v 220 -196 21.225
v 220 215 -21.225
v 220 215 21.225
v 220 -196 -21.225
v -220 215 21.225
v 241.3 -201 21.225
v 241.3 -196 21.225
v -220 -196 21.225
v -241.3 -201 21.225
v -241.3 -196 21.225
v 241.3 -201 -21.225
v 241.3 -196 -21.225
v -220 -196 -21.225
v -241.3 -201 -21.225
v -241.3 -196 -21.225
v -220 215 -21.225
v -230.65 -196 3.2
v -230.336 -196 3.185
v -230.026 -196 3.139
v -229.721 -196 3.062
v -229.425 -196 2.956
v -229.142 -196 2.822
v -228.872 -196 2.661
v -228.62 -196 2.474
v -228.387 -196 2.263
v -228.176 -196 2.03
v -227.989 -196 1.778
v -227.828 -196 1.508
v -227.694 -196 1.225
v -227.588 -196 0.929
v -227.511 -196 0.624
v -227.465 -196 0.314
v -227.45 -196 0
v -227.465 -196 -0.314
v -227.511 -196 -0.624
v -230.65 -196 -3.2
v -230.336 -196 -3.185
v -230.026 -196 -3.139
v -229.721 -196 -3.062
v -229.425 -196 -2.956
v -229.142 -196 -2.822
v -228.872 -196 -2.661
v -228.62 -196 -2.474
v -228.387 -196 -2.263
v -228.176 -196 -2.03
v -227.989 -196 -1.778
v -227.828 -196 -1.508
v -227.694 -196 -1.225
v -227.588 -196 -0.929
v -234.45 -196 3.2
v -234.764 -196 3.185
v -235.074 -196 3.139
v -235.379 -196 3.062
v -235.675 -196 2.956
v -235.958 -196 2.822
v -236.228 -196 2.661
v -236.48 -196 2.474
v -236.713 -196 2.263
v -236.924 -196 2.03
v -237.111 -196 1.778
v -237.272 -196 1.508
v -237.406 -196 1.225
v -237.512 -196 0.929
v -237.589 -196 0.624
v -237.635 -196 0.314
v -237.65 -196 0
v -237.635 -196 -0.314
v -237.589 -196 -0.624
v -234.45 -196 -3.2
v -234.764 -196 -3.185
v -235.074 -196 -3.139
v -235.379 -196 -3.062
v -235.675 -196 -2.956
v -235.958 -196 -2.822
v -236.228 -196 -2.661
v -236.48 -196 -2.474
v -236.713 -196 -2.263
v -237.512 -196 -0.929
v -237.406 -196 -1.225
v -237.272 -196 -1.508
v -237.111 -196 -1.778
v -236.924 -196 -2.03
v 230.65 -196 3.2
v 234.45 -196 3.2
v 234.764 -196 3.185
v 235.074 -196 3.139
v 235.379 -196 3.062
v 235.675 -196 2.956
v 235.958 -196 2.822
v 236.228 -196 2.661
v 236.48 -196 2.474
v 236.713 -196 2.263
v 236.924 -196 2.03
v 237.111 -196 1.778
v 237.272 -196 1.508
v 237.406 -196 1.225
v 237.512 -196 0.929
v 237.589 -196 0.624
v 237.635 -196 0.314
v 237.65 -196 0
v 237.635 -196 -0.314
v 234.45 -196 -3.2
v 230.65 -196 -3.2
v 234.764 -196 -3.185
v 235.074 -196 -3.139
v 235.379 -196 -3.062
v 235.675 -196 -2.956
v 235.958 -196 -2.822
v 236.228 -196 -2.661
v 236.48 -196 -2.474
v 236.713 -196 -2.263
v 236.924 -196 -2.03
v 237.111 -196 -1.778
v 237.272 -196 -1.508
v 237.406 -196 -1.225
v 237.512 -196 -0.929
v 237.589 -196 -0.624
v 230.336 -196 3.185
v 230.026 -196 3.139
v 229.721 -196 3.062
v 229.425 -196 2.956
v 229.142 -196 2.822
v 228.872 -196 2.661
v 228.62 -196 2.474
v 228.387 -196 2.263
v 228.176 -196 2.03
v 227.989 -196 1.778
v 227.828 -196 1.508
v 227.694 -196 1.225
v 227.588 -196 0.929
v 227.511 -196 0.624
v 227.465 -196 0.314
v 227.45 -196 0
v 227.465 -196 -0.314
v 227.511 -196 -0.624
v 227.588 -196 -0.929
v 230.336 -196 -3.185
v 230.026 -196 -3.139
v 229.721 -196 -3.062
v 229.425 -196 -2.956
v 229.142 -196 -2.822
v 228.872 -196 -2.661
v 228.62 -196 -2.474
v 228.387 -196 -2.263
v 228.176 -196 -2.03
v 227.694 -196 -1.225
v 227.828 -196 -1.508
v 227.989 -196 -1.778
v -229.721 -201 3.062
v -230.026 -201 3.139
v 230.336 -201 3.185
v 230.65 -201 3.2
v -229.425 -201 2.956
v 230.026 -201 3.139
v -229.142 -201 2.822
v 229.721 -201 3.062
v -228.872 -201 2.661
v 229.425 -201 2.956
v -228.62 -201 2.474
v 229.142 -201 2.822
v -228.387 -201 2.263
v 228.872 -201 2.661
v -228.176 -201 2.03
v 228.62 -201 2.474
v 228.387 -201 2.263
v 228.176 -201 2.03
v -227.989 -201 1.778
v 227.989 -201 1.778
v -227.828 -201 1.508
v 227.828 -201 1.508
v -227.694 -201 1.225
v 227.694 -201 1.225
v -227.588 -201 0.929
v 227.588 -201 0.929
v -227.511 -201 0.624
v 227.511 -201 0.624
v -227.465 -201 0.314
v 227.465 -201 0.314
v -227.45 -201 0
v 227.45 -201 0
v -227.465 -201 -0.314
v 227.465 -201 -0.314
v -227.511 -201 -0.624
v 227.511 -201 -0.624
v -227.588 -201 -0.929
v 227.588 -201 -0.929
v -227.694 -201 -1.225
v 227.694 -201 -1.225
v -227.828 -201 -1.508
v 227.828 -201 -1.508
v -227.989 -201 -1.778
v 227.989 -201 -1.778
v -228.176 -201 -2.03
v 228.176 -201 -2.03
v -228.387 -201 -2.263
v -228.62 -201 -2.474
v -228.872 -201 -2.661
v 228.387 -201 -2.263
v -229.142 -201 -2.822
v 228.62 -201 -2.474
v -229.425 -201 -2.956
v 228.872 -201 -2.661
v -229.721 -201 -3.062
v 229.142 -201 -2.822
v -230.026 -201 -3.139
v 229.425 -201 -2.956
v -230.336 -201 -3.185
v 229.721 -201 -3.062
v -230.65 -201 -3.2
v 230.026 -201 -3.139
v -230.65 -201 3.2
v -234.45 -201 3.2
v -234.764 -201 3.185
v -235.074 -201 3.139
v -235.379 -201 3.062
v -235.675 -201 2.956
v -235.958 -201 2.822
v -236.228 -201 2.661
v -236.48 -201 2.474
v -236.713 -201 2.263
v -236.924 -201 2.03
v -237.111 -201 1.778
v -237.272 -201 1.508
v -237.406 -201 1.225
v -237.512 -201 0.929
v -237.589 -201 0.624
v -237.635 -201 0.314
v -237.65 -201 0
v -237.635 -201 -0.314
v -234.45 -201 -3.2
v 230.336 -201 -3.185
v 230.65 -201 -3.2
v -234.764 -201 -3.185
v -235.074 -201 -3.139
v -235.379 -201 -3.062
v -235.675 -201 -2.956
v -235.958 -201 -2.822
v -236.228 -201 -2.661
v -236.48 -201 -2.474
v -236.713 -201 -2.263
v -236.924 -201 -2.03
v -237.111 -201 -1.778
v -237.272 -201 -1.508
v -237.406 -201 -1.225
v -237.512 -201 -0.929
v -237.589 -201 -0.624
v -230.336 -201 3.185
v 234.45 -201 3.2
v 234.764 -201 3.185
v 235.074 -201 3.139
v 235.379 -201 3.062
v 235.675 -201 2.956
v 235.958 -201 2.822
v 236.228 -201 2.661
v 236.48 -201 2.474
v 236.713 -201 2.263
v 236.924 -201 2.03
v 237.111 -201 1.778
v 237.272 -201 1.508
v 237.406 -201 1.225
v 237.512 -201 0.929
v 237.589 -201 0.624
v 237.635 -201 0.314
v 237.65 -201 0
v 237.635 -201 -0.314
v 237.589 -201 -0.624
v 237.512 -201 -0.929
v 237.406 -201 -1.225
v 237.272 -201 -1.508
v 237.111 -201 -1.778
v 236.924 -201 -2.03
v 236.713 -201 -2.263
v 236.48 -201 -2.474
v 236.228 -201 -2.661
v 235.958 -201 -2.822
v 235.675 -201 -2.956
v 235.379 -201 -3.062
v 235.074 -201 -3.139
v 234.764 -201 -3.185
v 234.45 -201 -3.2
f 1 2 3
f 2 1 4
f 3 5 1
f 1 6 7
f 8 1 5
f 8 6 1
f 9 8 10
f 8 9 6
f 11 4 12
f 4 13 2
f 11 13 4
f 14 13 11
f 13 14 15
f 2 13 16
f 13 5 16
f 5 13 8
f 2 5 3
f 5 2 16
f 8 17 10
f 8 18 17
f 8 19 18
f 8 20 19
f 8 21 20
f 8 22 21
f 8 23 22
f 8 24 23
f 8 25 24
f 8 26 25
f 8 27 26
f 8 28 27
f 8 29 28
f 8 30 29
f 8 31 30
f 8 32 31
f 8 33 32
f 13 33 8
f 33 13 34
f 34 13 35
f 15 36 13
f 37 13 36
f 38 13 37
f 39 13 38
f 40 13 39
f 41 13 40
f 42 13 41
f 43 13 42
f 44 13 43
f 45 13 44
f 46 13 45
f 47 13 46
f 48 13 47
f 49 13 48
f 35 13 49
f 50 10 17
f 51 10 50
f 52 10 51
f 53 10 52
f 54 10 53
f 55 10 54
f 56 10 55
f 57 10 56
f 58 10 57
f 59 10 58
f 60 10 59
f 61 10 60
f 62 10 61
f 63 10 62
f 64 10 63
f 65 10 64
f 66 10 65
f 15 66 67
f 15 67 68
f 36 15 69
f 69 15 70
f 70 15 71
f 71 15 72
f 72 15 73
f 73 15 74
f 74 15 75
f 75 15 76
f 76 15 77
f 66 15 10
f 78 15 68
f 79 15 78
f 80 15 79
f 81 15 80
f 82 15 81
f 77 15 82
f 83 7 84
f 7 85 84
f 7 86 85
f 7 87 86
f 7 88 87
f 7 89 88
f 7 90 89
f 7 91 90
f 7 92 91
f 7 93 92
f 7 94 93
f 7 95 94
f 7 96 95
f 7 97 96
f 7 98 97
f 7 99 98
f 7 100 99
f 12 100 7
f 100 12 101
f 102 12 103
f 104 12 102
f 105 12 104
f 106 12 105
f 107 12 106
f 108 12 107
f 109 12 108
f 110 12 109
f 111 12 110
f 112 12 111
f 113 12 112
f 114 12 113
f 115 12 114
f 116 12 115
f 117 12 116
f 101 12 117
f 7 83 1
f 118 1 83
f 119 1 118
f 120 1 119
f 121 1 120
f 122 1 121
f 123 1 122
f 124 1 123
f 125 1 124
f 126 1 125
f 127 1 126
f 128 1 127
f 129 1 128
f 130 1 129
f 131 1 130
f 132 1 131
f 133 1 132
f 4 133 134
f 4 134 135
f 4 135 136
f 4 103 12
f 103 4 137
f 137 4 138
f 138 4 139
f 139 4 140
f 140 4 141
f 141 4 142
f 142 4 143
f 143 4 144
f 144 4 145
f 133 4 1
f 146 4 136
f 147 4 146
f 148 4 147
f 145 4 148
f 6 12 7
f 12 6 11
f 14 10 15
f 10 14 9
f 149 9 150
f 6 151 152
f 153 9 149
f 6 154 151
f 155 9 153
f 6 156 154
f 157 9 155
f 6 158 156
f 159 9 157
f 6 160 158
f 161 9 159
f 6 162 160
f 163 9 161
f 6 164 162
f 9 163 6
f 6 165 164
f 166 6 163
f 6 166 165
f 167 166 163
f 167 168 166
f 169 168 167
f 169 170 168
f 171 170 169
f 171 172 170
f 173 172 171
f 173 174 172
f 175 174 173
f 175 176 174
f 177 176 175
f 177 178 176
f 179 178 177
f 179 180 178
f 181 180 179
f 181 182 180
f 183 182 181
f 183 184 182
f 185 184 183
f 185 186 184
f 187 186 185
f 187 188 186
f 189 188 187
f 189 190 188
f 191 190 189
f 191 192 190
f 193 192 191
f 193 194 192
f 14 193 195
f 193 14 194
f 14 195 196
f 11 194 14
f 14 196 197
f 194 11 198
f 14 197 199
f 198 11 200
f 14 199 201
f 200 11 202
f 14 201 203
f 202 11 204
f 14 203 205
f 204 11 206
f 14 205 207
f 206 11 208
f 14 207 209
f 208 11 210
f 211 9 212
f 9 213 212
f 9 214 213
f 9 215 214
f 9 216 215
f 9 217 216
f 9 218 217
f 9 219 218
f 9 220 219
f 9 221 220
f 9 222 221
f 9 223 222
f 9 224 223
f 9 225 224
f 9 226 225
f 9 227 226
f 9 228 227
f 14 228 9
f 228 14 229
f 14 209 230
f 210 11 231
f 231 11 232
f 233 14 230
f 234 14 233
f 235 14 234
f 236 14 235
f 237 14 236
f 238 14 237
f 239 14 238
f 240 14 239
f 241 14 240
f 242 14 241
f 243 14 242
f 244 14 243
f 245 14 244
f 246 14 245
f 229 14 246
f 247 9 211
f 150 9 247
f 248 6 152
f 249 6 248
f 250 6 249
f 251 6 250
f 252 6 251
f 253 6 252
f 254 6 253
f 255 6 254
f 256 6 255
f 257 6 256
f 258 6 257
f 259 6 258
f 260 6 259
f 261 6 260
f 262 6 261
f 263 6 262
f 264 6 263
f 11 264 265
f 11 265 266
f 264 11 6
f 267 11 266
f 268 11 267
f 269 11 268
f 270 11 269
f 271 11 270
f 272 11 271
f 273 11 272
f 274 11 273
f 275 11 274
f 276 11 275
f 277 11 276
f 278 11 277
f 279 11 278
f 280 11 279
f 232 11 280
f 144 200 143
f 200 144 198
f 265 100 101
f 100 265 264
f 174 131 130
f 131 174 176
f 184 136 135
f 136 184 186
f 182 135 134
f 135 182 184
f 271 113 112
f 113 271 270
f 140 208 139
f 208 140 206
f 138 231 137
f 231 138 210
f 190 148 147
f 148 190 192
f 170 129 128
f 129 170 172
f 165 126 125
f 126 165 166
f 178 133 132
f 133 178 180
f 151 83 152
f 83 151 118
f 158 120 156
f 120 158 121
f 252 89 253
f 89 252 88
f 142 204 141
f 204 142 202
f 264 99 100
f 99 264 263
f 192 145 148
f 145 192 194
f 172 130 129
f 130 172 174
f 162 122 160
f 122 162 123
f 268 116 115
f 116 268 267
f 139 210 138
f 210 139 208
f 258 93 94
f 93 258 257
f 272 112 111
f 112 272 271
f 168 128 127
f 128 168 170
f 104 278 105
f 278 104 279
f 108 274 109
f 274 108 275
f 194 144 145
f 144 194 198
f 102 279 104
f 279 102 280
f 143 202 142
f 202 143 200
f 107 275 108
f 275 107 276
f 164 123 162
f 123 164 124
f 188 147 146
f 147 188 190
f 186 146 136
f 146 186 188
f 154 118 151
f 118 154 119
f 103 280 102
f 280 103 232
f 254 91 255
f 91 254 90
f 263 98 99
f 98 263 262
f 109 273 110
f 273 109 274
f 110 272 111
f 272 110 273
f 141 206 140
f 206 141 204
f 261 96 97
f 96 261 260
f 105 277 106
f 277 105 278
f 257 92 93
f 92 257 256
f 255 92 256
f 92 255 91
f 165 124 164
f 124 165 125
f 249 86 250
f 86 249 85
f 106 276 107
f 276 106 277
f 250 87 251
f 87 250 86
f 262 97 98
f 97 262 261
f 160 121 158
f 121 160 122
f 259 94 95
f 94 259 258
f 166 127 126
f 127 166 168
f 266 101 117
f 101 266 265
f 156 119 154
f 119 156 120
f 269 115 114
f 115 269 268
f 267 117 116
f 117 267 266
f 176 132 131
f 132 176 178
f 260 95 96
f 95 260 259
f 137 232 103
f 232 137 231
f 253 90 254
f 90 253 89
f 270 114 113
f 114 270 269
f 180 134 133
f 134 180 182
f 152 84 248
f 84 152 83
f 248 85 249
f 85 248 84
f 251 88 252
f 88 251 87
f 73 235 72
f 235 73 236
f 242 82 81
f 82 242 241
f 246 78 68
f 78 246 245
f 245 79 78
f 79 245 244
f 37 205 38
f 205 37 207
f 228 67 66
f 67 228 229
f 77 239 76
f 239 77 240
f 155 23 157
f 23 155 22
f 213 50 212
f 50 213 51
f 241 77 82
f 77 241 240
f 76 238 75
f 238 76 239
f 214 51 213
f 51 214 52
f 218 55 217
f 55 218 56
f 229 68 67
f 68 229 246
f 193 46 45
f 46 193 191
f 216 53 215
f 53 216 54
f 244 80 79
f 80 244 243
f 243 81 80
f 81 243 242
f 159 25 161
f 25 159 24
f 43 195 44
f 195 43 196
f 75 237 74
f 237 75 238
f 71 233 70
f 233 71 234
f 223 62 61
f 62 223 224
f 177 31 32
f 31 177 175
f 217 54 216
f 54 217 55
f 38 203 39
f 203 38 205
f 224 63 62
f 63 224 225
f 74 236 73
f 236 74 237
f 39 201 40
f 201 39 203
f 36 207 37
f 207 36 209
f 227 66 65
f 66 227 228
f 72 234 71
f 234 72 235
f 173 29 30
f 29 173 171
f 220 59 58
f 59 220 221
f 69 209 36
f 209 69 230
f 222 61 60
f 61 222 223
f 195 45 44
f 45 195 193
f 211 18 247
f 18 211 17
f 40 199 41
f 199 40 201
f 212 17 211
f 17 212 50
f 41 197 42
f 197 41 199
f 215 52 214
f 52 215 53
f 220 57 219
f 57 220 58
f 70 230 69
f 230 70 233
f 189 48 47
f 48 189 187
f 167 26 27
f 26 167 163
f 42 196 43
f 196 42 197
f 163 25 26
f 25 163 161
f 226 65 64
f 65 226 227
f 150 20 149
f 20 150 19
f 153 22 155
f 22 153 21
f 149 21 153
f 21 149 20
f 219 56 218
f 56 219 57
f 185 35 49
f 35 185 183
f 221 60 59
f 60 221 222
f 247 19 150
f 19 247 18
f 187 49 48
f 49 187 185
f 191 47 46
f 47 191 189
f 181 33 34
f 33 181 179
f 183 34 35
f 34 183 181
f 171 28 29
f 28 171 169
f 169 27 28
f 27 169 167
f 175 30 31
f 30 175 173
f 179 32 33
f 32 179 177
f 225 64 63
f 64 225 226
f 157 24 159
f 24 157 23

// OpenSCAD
// ============================================================================
// Atom Lithography Machine — Parametric OpenSCAD Module (S1.4-02)
// ============================================================================
// part_id           : S1.4-02
// parent_bom_id     : S1.4
// subsystem         : S1
// part_name         : Femtoamper / pikoamper elektrometre okuma modulu
// material          : Al 6061
// temp_stage        : 300 K (kabin)
// vacuum_grade      : Atmosfer
// tolerance         : ±0.2% okuma
// computed_mass_kg  : 5.35001
// envelope_mm       : 482.600 x 442.500 x 42.450
// design_maturity   : M0_M1_DETAILED_CAD_DESIGN_ONLY
// no_lab_measurement: true
// iec61508_certified: false
// semi_s2_certified : false
// Units: millimeters (mm)
// ============================================================================

$fn = 64;

// Nominal bounding envelope parameters (mm)
bbox_x = 482.6000;
bbox_y = 442.5000;
bbox_z = 42.4500;

// Part-specific parametric dimensions
rack_u = 1;
u_slot = "U33";
qty_units = 2;
resolution_fA = 10.0;

// Interface / port parameters (mm)
port_triax_in_ch1_od = 14.000;
port_triax_in_ch2_od = 14.000;

module part_S1_4_02() {
  difference() {
    union() {
      // 1U hollow 19-in chassis body (width along X)
      translate([0.000, 9.500, 0.000]) cube([440.000, 411.000, 42.450], center=true);
      // EIA-310 19-in front panel w/ mounting ears facing -Y
      translate([0.000, -198.500, 0.000]) cube([482.600, 5.000, 42.450], center=true);
    }
    // EIA-310 +X rack slot
    translate([232.550, -198.500, 0.000]) rotate([90.000, 0.000, 0.000]) {
      hull() {
        translate([-1.900, 0, 0]) cylinder(d=6.400, h=9.000, center=true);
        translate([1.900, 0, 0]) cylinder(d=6.400, h=9.000, center=true);
      }
    }
    // EIA-310 -X rack slot
    translate([-232.550, -198.500, 0.000]) rotate([90.000, 0.000, 0.000]) {
      hull() {
        translate([-1.900, 0, 0]) cylinder(d=6.400, h=9.000, center=true);
        translate([1.900, 0, 0]) cylinder(d=6.400, h=9.000, center=true);
      }
    }
  }
}

// World assembly mounting transform (global machine frame, mm / deg):
// translate([1480.000, -223.000, 1034.625]) rotate([0.000, 0.000, 0.000]) part_S1_4_02();

part_S1_4_02();
